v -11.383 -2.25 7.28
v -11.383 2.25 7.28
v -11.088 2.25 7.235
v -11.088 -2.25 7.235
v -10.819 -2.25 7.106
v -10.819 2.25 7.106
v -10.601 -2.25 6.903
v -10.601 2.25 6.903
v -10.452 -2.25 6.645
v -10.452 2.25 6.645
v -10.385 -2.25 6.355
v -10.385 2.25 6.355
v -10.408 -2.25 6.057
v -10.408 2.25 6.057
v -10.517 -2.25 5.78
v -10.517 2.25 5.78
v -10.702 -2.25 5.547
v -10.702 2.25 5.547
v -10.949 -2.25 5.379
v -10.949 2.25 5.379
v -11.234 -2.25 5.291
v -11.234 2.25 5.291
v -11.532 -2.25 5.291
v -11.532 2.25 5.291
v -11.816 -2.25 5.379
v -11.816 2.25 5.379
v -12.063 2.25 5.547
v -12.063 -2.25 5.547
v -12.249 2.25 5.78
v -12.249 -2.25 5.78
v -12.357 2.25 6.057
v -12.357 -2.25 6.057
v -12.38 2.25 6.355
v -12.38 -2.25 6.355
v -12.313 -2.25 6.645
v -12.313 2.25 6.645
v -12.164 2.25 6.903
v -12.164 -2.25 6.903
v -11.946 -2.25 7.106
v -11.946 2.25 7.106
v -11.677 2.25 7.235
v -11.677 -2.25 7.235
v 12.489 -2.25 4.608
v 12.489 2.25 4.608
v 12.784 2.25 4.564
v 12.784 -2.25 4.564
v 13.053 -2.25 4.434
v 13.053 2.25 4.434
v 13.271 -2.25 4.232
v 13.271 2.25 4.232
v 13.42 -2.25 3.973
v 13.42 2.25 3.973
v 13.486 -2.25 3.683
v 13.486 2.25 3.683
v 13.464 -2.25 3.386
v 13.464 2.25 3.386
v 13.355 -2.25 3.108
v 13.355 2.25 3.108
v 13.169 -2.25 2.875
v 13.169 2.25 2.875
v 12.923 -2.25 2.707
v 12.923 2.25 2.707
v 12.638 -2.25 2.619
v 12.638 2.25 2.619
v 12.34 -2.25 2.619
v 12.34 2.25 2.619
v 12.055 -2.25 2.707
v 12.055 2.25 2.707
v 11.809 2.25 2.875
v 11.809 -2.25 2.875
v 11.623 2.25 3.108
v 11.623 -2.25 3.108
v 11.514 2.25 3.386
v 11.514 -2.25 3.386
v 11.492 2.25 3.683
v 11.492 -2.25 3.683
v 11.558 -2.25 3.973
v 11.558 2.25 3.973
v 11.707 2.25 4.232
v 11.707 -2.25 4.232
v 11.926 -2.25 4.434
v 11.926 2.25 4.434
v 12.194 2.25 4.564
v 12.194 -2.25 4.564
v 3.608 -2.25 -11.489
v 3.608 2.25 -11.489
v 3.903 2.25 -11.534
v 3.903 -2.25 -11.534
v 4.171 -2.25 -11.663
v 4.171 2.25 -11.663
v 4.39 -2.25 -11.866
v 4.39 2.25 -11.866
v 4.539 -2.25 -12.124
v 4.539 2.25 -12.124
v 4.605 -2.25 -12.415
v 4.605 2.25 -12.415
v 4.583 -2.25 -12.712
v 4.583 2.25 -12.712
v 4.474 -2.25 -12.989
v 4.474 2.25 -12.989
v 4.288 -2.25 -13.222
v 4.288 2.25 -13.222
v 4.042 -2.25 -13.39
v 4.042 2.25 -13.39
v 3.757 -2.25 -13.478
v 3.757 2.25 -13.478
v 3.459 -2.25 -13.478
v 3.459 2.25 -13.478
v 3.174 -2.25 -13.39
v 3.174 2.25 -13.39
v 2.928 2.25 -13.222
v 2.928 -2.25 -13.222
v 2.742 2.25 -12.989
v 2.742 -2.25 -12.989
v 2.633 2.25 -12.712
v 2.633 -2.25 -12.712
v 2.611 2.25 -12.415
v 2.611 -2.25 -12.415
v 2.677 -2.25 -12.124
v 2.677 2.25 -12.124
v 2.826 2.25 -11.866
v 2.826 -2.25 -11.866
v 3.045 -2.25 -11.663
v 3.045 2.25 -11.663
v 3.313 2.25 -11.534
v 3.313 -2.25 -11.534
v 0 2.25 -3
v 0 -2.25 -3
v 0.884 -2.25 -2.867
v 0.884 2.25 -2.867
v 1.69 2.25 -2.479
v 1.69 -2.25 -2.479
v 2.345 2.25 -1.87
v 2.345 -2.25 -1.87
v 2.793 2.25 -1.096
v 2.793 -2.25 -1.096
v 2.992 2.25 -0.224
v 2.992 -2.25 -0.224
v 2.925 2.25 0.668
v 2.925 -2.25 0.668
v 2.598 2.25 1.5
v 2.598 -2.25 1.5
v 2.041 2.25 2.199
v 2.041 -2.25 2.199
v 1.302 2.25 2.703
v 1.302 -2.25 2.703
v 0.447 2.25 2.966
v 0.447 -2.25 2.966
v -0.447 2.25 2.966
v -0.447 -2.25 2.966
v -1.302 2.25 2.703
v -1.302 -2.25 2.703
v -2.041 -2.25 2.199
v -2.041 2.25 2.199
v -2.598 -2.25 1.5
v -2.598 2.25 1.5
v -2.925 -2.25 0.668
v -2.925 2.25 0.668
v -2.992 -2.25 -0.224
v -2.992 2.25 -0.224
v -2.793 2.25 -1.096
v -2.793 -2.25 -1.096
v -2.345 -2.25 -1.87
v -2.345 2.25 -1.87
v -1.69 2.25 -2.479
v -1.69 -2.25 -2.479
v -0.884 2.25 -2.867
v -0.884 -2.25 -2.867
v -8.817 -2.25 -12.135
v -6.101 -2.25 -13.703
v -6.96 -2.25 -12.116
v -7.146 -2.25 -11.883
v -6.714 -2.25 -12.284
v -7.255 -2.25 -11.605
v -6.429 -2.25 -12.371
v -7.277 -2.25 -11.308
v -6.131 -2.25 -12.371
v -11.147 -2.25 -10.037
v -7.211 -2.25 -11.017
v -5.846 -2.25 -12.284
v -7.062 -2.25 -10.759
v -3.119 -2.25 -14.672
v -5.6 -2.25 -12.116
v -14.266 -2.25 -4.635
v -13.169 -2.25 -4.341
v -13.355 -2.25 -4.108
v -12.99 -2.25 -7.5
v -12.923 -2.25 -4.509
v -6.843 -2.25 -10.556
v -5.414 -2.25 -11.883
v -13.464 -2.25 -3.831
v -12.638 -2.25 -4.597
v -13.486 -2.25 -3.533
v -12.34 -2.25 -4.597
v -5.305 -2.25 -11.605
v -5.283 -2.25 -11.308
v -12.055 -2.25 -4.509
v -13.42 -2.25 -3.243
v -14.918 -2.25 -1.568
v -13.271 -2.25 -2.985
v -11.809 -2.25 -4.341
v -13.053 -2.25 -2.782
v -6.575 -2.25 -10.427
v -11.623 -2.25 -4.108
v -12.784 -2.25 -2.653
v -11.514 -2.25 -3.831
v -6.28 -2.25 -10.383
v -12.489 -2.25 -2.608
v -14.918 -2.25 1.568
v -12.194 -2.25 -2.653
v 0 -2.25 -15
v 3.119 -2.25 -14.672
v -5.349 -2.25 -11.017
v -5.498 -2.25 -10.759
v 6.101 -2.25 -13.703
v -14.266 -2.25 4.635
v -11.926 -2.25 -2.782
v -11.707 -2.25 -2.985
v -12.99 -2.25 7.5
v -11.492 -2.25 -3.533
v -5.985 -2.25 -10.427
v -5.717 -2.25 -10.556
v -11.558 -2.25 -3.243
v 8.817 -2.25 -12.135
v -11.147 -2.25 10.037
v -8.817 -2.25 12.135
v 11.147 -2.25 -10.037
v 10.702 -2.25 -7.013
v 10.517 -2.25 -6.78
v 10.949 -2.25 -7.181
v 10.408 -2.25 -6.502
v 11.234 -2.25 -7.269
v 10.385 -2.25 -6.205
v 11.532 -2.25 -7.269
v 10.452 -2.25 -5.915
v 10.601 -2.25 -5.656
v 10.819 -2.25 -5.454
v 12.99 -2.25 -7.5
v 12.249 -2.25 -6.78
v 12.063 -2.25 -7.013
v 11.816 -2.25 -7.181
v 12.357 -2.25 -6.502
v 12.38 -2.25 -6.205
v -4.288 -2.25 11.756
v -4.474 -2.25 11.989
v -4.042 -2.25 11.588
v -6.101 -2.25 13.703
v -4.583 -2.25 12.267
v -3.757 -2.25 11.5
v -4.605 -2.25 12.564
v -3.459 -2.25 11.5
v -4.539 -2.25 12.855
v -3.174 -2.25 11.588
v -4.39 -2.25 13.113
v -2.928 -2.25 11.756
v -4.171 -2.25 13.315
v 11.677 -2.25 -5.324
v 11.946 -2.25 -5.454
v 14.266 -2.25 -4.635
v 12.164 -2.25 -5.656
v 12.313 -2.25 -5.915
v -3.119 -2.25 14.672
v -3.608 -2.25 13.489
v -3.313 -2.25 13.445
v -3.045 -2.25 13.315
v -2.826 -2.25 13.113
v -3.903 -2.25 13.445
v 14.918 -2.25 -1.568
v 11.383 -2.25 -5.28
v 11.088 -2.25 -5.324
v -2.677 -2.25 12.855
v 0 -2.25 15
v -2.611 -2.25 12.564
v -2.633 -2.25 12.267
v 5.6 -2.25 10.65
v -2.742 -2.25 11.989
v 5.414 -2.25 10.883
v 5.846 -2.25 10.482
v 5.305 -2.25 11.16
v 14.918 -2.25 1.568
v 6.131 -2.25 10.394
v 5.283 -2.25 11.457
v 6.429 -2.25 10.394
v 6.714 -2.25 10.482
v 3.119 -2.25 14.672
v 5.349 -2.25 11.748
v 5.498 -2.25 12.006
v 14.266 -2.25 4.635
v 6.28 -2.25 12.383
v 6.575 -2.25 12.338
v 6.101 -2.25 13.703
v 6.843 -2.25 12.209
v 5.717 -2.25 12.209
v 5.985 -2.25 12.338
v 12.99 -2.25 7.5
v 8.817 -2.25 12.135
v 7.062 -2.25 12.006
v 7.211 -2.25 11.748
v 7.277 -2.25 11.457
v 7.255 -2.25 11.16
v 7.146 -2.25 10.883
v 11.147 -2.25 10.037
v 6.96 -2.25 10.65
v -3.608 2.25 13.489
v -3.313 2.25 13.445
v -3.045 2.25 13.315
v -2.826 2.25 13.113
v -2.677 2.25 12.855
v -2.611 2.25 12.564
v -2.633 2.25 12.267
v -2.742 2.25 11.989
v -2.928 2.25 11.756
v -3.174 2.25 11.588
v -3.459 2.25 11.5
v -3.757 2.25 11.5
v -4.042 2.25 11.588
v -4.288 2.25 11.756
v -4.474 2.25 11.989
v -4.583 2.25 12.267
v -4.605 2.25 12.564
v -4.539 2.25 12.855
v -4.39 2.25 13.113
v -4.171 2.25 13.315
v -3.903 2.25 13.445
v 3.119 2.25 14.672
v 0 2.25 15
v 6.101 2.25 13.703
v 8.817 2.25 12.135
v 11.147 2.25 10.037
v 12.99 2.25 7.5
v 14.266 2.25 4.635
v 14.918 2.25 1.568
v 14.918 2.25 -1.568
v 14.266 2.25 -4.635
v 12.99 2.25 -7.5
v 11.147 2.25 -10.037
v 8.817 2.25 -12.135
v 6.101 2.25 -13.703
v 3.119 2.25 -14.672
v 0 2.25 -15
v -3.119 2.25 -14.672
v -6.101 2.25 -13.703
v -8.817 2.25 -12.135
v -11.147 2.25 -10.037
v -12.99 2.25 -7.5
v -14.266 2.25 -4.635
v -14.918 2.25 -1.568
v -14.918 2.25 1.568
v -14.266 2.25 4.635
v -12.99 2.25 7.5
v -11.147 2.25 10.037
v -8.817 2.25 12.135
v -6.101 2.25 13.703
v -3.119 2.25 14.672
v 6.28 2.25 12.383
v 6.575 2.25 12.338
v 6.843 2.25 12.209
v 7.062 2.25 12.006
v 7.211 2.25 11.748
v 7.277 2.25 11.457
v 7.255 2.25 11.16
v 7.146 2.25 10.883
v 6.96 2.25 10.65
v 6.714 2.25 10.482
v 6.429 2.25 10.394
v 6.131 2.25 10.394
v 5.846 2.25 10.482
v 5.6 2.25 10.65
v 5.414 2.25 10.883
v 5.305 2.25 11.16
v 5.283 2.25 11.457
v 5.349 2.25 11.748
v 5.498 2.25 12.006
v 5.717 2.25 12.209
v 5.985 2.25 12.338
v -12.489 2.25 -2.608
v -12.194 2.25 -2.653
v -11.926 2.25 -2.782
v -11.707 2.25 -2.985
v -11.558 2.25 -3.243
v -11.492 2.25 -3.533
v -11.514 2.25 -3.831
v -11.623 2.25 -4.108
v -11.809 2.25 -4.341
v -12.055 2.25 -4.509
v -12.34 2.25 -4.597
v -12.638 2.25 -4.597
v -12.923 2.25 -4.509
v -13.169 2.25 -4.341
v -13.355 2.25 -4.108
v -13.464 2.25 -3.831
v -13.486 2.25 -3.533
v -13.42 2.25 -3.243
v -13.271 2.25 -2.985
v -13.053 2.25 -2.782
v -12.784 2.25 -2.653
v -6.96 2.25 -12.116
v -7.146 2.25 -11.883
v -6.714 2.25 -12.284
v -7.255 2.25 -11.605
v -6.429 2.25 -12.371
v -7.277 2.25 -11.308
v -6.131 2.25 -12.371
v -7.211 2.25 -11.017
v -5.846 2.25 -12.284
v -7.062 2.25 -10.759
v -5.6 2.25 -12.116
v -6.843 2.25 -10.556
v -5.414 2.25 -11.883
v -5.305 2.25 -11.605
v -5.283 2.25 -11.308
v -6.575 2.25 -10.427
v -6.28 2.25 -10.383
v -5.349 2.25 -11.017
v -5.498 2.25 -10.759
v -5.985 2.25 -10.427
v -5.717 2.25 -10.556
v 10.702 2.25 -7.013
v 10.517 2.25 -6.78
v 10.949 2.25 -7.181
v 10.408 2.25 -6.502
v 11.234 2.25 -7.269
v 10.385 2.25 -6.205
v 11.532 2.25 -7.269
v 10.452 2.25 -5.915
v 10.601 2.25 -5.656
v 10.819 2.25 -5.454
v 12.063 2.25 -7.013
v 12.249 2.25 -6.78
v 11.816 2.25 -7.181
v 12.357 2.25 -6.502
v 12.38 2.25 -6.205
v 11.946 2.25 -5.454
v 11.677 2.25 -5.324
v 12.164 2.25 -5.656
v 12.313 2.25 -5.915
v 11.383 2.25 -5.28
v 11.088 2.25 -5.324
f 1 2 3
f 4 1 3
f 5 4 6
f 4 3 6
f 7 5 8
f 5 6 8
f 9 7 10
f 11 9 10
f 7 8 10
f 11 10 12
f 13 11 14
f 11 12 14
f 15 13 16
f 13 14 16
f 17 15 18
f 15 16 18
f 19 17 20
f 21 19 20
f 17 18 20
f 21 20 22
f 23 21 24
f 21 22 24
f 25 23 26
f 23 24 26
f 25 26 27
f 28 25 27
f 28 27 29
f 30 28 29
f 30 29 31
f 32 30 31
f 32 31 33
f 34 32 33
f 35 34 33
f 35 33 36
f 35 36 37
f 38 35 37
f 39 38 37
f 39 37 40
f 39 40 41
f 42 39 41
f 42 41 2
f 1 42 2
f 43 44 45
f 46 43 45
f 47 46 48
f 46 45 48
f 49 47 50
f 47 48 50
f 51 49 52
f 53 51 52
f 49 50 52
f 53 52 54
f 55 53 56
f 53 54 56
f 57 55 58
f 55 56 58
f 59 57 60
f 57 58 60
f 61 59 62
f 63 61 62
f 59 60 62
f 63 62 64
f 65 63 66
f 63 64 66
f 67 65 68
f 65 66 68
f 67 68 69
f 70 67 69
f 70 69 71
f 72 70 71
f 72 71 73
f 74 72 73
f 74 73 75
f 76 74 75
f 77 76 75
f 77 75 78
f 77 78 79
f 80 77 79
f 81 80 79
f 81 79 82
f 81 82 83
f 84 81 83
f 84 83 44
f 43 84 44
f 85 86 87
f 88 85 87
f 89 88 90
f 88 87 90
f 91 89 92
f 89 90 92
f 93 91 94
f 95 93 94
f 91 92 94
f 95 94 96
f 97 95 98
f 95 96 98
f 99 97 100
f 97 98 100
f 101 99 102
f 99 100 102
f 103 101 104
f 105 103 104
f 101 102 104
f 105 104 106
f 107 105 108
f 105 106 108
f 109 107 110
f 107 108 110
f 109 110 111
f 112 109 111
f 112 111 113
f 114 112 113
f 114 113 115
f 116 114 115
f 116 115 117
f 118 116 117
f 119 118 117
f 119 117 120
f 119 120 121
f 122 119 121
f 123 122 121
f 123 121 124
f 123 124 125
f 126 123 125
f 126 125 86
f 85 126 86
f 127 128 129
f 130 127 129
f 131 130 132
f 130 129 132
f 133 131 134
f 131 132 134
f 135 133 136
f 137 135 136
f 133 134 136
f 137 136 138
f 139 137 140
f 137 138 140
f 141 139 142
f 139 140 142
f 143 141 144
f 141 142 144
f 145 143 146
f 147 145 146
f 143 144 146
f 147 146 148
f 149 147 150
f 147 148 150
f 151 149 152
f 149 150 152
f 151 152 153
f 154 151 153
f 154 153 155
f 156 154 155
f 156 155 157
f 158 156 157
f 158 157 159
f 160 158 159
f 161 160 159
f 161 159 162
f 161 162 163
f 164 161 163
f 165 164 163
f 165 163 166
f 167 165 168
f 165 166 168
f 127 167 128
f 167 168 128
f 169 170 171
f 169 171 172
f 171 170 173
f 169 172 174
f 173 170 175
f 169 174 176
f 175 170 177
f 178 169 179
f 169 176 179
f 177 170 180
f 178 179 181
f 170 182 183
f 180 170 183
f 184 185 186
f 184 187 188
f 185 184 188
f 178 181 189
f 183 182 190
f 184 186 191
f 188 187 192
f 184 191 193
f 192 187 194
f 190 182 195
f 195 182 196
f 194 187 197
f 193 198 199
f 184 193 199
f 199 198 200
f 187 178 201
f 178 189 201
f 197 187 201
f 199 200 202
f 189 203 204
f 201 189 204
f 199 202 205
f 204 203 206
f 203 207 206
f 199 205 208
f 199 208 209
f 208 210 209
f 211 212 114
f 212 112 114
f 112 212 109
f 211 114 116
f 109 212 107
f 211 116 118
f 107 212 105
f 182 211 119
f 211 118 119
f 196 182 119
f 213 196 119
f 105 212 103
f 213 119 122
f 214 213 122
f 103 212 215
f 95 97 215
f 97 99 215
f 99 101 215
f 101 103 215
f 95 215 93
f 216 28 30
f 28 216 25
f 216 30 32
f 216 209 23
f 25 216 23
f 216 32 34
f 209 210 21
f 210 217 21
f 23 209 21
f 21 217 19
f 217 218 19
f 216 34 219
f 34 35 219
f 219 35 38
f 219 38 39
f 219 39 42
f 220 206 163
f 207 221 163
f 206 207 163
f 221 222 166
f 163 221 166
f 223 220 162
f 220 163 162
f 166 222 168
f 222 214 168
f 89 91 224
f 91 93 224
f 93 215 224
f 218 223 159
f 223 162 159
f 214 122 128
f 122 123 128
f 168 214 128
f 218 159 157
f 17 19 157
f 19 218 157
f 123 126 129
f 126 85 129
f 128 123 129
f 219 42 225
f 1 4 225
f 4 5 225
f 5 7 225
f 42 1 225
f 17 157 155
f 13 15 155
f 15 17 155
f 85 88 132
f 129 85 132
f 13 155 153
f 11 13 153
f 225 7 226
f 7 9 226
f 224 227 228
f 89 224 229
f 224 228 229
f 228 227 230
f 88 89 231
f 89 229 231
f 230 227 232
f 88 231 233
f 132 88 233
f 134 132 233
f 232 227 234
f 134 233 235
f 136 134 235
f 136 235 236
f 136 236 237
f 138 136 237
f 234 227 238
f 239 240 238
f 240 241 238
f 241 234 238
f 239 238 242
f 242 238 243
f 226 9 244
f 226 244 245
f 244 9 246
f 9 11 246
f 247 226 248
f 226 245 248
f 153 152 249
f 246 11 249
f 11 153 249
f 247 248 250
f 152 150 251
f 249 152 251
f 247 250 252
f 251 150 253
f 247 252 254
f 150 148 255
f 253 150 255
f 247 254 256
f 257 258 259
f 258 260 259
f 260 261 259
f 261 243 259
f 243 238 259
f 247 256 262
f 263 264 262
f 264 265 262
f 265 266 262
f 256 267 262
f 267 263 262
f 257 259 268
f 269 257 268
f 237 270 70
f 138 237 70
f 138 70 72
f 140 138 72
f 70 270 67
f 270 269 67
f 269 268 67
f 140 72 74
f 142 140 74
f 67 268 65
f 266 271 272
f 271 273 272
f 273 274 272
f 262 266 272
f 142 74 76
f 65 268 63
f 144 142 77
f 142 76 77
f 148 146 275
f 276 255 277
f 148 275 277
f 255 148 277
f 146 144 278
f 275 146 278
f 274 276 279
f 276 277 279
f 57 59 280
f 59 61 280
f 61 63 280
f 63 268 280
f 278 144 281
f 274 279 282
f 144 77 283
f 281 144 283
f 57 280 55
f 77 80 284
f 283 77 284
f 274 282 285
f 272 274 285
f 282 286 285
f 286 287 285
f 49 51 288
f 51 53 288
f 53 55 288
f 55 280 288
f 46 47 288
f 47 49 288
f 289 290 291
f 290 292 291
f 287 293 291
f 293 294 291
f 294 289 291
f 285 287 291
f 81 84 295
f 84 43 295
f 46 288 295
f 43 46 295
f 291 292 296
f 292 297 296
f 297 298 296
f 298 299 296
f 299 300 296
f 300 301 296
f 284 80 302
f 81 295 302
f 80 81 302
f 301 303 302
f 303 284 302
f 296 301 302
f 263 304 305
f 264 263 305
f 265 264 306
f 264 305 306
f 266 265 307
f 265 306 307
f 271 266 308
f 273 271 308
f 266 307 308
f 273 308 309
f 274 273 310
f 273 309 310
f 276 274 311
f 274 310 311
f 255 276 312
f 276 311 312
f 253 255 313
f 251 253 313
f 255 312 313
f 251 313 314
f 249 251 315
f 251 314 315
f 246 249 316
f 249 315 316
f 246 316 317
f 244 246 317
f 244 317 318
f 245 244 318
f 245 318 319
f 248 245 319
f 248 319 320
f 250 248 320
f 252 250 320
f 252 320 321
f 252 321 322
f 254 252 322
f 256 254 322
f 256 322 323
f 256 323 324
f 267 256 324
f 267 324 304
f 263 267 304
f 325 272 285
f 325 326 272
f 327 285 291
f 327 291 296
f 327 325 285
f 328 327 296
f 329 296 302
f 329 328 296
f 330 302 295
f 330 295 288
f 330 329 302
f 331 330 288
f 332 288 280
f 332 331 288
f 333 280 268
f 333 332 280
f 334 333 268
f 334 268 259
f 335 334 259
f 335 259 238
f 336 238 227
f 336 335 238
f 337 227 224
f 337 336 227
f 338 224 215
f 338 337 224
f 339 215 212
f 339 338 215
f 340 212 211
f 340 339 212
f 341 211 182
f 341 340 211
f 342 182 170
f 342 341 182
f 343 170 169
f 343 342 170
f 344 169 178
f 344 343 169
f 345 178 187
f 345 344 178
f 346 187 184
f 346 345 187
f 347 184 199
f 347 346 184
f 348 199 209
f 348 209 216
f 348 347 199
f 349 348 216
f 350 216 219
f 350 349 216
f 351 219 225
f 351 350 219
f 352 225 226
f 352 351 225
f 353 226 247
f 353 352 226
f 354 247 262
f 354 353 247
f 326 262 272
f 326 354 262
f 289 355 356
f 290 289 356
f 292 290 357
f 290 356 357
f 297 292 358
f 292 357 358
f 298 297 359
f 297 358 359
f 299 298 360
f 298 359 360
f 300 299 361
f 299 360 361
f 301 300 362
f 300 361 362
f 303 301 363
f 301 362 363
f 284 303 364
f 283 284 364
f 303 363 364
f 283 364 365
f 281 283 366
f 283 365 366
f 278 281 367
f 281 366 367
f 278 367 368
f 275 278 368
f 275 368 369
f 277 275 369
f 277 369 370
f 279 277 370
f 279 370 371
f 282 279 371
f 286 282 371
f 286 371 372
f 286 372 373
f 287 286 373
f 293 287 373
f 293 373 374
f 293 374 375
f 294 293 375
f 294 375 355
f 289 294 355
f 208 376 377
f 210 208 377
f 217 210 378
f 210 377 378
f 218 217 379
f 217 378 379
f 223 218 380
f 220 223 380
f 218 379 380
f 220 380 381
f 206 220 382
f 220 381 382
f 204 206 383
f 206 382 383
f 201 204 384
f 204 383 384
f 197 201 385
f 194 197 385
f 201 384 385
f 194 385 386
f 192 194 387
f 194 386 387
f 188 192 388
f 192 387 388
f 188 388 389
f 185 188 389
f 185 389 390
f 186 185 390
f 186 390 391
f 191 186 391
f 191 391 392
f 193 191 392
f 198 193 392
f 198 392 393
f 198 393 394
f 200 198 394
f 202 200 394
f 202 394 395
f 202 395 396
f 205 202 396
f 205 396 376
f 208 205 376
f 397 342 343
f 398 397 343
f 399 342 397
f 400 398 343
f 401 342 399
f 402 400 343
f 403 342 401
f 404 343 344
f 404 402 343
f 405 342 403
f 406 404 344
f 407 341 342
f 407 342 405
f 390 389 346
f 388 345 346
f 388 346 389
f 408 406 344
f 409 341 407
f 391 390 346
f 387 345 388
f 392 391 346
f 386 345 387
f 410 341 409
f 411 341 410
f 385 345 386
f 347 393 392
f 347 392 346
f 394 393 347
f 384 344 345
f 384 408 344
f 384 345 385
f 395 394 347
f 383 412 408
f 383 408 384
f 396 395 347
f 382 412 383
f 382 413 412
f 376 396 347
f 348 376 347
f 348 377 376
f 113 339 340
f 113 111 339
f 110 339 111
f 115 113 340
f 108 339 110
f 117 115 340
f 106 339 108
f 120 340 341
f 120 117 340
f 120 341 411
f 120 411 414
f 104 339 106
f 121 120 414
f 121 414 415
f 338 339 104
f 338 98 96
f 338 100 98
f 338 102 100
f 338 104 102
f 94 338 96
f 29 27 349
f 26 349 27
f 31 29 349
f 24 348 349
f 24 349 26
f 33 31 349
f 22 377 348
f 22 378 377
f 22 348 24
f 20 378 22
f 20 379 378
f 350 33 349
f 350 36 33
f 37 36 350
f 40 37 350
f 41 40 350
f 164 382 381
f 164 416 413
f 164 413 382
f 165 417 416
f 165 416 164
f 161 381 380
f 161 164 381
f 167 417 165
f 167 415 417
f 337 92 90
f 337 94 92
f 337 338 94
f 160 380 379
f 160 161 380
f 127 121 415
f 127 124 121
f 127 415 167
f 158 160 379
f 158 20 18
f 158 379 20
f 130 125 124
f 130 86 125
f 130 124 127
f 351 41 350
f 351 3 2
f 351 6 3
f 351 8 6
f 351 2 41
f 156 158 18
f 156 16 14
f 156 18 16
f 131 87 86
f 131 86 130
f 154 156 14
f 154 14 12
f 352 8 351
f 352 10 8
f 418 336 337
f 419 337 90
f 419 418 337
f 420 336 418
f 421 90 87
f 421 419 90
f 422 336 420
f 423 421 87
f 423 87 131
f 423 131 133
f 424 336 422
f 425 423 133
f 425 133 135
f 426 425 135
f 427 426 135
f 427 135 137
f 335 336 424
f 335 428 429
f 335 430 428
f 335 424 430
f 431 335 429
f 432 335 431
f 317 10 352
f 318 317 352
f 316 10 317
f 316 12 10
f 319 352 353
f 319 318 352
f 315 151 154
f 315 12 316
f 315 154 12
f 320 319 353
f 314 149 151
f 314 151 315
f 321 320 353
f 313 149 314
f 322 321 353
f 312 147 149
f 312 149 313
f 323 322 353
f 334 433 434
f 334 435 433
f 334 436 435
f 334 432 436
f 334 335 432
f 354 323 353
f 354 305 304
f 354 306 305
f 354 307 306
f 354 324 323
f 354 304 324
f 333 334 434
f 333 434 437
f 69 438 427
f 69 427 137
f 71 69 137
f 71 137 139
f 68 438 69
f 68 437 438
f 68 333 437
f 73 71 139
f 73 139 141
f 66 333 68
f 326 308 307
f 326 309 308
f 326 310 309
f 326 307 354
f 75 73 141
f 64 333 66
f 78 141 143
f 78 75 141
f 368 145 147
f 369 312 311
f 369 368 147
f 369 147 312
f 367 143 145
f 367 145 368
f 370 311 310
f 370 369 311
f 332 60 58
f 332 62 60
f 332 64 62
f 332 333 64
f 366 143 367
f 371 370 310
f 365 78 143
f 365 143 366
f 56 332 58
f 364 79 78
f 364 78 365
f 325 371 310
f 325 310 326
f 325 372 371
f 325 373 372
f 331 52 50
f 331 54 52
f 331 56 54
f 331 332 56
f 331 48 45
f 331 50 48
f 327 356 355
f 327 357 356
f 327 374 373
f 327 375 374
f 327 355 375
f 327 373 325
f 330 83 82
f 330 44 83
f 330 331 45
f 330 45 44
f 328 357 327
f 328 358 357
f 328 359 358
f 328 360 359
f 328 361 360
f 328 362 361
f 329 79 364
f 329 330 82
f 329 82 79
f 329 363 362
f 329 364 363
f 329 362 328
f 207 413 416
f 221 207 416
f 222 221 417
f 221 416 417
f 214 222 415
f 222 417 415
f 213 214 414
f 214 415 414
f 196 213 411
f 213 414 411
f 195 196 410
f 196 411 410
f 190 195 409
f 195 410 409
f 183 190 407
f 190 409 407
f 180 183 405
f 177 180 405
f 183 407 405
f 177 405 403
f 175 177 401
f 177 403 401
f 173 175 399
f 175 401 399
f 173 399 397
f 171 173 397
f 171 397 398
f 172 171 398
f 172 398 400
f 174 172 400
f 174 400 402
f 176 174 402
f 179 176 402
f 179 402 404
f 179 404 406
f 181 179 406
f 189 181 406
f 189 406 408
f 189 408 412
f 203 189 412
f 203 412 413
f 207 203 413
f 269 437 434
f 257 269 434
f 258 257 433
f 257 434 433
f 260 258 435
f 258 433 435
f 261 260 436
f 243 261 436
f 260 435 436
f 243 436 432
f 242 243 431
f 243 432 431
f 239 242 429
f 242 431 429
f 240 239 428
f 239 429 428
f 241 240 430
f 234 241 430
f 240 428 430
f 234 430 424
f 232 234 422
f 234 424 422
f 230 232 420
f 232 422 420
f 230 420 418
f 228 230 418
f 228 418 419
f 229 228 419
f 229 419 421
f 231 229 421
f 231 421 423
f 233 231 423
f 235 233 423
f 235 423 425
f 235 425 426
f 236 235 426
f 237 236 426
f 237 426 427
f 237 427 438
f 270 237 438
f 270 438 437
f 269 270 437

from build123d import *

# Parameters (mm, degrees)
SKETCH_1_R          = 15
EXTRUDE_1_DEPTH     = 2.25
SKETCH_3_R          = 1
CUT_EXTRUDE_1_DEPTH = 5
SKETCH_4_R          = 3
CUT_EXTRUDE_2_DEPTH = 4.5


with BuildPart() as part:
    # ｽｹｯﾁ1 → ﾎﾞｽ - 押し出し1 (new, symmetric)
    with BuildSketch(Plane(origin=(0, 0, 0), x_dir=(1, 0, 0), z_dir=(0, 1, 0))):
        with Locations(Location((0, 0, 0), (0, 0, 270))):
            Circle(SKETCH_1_R)
    extrude(amount=EXTRUDE_1_DEPTH, both=True)

    # ｽｹｯﾁ3 → ｶｯﾄ - 押し出し1 (cut)
    with BuildSketch(Plane(origin=(0, 2.25, 0), x_dir=(1, 0, 0), z_dir=(0, 1, 0))):
        with Locations(Location((-11.382561056, -6.279912723, 0), (0, 0, 270))):
            Circle(SKETCH_3_R)
        with Locations(Location((-12.489254982, 3.608117238, 0), (0, 0, 270))):
            Circle(SKETCH_3_R)
        with Locations(Location((-6.279912723, 11.382561056, 0), (0, 0, 270))):
            Circle(SKETCH_3_R)
        with Locations(Location((3.608117238, 12.489254982, 0), (0, 0, 270))):
            Circle(SKETCH_3_R)
        with Locations(Location((11.382561056, 6.279912723, 0), (0, 0, 270))):
            Circle(SKETCH_3_R)
        with Locations(Location((12.489254982, -3.608117238, 0), (0, 0, 270))):
            Circle(SKETCH_3_R)
        with Locations(Location((6.279912723, -11.382561056, 0), (0, 0, 270))):
            Circle(SKETCH_3_R)
        with Locations(Location((-3.608117238, -12.489254982, 0), (0, 0, 270))):
            Circle(SKETCH_3_R)
    extrude(amount=-CUT_EXTRUDE_1_DEPTH, mode=Mode.SUBTRACT)

    # ｽｹｯﾁ4 → ｶｯﾄ - 押し出し2 (cut)
    with BuildSketch(Plane.XZ.offset(2.25)):
        with Locations(Location((0, 0, 0), (0, 0, 270))):
            Circle(SKETCH_4_R)
    extrude(amount=-CUT_EXTRUDE_2_DEPTH, mode=Mode.SUBTRACT)


solid = part.part
